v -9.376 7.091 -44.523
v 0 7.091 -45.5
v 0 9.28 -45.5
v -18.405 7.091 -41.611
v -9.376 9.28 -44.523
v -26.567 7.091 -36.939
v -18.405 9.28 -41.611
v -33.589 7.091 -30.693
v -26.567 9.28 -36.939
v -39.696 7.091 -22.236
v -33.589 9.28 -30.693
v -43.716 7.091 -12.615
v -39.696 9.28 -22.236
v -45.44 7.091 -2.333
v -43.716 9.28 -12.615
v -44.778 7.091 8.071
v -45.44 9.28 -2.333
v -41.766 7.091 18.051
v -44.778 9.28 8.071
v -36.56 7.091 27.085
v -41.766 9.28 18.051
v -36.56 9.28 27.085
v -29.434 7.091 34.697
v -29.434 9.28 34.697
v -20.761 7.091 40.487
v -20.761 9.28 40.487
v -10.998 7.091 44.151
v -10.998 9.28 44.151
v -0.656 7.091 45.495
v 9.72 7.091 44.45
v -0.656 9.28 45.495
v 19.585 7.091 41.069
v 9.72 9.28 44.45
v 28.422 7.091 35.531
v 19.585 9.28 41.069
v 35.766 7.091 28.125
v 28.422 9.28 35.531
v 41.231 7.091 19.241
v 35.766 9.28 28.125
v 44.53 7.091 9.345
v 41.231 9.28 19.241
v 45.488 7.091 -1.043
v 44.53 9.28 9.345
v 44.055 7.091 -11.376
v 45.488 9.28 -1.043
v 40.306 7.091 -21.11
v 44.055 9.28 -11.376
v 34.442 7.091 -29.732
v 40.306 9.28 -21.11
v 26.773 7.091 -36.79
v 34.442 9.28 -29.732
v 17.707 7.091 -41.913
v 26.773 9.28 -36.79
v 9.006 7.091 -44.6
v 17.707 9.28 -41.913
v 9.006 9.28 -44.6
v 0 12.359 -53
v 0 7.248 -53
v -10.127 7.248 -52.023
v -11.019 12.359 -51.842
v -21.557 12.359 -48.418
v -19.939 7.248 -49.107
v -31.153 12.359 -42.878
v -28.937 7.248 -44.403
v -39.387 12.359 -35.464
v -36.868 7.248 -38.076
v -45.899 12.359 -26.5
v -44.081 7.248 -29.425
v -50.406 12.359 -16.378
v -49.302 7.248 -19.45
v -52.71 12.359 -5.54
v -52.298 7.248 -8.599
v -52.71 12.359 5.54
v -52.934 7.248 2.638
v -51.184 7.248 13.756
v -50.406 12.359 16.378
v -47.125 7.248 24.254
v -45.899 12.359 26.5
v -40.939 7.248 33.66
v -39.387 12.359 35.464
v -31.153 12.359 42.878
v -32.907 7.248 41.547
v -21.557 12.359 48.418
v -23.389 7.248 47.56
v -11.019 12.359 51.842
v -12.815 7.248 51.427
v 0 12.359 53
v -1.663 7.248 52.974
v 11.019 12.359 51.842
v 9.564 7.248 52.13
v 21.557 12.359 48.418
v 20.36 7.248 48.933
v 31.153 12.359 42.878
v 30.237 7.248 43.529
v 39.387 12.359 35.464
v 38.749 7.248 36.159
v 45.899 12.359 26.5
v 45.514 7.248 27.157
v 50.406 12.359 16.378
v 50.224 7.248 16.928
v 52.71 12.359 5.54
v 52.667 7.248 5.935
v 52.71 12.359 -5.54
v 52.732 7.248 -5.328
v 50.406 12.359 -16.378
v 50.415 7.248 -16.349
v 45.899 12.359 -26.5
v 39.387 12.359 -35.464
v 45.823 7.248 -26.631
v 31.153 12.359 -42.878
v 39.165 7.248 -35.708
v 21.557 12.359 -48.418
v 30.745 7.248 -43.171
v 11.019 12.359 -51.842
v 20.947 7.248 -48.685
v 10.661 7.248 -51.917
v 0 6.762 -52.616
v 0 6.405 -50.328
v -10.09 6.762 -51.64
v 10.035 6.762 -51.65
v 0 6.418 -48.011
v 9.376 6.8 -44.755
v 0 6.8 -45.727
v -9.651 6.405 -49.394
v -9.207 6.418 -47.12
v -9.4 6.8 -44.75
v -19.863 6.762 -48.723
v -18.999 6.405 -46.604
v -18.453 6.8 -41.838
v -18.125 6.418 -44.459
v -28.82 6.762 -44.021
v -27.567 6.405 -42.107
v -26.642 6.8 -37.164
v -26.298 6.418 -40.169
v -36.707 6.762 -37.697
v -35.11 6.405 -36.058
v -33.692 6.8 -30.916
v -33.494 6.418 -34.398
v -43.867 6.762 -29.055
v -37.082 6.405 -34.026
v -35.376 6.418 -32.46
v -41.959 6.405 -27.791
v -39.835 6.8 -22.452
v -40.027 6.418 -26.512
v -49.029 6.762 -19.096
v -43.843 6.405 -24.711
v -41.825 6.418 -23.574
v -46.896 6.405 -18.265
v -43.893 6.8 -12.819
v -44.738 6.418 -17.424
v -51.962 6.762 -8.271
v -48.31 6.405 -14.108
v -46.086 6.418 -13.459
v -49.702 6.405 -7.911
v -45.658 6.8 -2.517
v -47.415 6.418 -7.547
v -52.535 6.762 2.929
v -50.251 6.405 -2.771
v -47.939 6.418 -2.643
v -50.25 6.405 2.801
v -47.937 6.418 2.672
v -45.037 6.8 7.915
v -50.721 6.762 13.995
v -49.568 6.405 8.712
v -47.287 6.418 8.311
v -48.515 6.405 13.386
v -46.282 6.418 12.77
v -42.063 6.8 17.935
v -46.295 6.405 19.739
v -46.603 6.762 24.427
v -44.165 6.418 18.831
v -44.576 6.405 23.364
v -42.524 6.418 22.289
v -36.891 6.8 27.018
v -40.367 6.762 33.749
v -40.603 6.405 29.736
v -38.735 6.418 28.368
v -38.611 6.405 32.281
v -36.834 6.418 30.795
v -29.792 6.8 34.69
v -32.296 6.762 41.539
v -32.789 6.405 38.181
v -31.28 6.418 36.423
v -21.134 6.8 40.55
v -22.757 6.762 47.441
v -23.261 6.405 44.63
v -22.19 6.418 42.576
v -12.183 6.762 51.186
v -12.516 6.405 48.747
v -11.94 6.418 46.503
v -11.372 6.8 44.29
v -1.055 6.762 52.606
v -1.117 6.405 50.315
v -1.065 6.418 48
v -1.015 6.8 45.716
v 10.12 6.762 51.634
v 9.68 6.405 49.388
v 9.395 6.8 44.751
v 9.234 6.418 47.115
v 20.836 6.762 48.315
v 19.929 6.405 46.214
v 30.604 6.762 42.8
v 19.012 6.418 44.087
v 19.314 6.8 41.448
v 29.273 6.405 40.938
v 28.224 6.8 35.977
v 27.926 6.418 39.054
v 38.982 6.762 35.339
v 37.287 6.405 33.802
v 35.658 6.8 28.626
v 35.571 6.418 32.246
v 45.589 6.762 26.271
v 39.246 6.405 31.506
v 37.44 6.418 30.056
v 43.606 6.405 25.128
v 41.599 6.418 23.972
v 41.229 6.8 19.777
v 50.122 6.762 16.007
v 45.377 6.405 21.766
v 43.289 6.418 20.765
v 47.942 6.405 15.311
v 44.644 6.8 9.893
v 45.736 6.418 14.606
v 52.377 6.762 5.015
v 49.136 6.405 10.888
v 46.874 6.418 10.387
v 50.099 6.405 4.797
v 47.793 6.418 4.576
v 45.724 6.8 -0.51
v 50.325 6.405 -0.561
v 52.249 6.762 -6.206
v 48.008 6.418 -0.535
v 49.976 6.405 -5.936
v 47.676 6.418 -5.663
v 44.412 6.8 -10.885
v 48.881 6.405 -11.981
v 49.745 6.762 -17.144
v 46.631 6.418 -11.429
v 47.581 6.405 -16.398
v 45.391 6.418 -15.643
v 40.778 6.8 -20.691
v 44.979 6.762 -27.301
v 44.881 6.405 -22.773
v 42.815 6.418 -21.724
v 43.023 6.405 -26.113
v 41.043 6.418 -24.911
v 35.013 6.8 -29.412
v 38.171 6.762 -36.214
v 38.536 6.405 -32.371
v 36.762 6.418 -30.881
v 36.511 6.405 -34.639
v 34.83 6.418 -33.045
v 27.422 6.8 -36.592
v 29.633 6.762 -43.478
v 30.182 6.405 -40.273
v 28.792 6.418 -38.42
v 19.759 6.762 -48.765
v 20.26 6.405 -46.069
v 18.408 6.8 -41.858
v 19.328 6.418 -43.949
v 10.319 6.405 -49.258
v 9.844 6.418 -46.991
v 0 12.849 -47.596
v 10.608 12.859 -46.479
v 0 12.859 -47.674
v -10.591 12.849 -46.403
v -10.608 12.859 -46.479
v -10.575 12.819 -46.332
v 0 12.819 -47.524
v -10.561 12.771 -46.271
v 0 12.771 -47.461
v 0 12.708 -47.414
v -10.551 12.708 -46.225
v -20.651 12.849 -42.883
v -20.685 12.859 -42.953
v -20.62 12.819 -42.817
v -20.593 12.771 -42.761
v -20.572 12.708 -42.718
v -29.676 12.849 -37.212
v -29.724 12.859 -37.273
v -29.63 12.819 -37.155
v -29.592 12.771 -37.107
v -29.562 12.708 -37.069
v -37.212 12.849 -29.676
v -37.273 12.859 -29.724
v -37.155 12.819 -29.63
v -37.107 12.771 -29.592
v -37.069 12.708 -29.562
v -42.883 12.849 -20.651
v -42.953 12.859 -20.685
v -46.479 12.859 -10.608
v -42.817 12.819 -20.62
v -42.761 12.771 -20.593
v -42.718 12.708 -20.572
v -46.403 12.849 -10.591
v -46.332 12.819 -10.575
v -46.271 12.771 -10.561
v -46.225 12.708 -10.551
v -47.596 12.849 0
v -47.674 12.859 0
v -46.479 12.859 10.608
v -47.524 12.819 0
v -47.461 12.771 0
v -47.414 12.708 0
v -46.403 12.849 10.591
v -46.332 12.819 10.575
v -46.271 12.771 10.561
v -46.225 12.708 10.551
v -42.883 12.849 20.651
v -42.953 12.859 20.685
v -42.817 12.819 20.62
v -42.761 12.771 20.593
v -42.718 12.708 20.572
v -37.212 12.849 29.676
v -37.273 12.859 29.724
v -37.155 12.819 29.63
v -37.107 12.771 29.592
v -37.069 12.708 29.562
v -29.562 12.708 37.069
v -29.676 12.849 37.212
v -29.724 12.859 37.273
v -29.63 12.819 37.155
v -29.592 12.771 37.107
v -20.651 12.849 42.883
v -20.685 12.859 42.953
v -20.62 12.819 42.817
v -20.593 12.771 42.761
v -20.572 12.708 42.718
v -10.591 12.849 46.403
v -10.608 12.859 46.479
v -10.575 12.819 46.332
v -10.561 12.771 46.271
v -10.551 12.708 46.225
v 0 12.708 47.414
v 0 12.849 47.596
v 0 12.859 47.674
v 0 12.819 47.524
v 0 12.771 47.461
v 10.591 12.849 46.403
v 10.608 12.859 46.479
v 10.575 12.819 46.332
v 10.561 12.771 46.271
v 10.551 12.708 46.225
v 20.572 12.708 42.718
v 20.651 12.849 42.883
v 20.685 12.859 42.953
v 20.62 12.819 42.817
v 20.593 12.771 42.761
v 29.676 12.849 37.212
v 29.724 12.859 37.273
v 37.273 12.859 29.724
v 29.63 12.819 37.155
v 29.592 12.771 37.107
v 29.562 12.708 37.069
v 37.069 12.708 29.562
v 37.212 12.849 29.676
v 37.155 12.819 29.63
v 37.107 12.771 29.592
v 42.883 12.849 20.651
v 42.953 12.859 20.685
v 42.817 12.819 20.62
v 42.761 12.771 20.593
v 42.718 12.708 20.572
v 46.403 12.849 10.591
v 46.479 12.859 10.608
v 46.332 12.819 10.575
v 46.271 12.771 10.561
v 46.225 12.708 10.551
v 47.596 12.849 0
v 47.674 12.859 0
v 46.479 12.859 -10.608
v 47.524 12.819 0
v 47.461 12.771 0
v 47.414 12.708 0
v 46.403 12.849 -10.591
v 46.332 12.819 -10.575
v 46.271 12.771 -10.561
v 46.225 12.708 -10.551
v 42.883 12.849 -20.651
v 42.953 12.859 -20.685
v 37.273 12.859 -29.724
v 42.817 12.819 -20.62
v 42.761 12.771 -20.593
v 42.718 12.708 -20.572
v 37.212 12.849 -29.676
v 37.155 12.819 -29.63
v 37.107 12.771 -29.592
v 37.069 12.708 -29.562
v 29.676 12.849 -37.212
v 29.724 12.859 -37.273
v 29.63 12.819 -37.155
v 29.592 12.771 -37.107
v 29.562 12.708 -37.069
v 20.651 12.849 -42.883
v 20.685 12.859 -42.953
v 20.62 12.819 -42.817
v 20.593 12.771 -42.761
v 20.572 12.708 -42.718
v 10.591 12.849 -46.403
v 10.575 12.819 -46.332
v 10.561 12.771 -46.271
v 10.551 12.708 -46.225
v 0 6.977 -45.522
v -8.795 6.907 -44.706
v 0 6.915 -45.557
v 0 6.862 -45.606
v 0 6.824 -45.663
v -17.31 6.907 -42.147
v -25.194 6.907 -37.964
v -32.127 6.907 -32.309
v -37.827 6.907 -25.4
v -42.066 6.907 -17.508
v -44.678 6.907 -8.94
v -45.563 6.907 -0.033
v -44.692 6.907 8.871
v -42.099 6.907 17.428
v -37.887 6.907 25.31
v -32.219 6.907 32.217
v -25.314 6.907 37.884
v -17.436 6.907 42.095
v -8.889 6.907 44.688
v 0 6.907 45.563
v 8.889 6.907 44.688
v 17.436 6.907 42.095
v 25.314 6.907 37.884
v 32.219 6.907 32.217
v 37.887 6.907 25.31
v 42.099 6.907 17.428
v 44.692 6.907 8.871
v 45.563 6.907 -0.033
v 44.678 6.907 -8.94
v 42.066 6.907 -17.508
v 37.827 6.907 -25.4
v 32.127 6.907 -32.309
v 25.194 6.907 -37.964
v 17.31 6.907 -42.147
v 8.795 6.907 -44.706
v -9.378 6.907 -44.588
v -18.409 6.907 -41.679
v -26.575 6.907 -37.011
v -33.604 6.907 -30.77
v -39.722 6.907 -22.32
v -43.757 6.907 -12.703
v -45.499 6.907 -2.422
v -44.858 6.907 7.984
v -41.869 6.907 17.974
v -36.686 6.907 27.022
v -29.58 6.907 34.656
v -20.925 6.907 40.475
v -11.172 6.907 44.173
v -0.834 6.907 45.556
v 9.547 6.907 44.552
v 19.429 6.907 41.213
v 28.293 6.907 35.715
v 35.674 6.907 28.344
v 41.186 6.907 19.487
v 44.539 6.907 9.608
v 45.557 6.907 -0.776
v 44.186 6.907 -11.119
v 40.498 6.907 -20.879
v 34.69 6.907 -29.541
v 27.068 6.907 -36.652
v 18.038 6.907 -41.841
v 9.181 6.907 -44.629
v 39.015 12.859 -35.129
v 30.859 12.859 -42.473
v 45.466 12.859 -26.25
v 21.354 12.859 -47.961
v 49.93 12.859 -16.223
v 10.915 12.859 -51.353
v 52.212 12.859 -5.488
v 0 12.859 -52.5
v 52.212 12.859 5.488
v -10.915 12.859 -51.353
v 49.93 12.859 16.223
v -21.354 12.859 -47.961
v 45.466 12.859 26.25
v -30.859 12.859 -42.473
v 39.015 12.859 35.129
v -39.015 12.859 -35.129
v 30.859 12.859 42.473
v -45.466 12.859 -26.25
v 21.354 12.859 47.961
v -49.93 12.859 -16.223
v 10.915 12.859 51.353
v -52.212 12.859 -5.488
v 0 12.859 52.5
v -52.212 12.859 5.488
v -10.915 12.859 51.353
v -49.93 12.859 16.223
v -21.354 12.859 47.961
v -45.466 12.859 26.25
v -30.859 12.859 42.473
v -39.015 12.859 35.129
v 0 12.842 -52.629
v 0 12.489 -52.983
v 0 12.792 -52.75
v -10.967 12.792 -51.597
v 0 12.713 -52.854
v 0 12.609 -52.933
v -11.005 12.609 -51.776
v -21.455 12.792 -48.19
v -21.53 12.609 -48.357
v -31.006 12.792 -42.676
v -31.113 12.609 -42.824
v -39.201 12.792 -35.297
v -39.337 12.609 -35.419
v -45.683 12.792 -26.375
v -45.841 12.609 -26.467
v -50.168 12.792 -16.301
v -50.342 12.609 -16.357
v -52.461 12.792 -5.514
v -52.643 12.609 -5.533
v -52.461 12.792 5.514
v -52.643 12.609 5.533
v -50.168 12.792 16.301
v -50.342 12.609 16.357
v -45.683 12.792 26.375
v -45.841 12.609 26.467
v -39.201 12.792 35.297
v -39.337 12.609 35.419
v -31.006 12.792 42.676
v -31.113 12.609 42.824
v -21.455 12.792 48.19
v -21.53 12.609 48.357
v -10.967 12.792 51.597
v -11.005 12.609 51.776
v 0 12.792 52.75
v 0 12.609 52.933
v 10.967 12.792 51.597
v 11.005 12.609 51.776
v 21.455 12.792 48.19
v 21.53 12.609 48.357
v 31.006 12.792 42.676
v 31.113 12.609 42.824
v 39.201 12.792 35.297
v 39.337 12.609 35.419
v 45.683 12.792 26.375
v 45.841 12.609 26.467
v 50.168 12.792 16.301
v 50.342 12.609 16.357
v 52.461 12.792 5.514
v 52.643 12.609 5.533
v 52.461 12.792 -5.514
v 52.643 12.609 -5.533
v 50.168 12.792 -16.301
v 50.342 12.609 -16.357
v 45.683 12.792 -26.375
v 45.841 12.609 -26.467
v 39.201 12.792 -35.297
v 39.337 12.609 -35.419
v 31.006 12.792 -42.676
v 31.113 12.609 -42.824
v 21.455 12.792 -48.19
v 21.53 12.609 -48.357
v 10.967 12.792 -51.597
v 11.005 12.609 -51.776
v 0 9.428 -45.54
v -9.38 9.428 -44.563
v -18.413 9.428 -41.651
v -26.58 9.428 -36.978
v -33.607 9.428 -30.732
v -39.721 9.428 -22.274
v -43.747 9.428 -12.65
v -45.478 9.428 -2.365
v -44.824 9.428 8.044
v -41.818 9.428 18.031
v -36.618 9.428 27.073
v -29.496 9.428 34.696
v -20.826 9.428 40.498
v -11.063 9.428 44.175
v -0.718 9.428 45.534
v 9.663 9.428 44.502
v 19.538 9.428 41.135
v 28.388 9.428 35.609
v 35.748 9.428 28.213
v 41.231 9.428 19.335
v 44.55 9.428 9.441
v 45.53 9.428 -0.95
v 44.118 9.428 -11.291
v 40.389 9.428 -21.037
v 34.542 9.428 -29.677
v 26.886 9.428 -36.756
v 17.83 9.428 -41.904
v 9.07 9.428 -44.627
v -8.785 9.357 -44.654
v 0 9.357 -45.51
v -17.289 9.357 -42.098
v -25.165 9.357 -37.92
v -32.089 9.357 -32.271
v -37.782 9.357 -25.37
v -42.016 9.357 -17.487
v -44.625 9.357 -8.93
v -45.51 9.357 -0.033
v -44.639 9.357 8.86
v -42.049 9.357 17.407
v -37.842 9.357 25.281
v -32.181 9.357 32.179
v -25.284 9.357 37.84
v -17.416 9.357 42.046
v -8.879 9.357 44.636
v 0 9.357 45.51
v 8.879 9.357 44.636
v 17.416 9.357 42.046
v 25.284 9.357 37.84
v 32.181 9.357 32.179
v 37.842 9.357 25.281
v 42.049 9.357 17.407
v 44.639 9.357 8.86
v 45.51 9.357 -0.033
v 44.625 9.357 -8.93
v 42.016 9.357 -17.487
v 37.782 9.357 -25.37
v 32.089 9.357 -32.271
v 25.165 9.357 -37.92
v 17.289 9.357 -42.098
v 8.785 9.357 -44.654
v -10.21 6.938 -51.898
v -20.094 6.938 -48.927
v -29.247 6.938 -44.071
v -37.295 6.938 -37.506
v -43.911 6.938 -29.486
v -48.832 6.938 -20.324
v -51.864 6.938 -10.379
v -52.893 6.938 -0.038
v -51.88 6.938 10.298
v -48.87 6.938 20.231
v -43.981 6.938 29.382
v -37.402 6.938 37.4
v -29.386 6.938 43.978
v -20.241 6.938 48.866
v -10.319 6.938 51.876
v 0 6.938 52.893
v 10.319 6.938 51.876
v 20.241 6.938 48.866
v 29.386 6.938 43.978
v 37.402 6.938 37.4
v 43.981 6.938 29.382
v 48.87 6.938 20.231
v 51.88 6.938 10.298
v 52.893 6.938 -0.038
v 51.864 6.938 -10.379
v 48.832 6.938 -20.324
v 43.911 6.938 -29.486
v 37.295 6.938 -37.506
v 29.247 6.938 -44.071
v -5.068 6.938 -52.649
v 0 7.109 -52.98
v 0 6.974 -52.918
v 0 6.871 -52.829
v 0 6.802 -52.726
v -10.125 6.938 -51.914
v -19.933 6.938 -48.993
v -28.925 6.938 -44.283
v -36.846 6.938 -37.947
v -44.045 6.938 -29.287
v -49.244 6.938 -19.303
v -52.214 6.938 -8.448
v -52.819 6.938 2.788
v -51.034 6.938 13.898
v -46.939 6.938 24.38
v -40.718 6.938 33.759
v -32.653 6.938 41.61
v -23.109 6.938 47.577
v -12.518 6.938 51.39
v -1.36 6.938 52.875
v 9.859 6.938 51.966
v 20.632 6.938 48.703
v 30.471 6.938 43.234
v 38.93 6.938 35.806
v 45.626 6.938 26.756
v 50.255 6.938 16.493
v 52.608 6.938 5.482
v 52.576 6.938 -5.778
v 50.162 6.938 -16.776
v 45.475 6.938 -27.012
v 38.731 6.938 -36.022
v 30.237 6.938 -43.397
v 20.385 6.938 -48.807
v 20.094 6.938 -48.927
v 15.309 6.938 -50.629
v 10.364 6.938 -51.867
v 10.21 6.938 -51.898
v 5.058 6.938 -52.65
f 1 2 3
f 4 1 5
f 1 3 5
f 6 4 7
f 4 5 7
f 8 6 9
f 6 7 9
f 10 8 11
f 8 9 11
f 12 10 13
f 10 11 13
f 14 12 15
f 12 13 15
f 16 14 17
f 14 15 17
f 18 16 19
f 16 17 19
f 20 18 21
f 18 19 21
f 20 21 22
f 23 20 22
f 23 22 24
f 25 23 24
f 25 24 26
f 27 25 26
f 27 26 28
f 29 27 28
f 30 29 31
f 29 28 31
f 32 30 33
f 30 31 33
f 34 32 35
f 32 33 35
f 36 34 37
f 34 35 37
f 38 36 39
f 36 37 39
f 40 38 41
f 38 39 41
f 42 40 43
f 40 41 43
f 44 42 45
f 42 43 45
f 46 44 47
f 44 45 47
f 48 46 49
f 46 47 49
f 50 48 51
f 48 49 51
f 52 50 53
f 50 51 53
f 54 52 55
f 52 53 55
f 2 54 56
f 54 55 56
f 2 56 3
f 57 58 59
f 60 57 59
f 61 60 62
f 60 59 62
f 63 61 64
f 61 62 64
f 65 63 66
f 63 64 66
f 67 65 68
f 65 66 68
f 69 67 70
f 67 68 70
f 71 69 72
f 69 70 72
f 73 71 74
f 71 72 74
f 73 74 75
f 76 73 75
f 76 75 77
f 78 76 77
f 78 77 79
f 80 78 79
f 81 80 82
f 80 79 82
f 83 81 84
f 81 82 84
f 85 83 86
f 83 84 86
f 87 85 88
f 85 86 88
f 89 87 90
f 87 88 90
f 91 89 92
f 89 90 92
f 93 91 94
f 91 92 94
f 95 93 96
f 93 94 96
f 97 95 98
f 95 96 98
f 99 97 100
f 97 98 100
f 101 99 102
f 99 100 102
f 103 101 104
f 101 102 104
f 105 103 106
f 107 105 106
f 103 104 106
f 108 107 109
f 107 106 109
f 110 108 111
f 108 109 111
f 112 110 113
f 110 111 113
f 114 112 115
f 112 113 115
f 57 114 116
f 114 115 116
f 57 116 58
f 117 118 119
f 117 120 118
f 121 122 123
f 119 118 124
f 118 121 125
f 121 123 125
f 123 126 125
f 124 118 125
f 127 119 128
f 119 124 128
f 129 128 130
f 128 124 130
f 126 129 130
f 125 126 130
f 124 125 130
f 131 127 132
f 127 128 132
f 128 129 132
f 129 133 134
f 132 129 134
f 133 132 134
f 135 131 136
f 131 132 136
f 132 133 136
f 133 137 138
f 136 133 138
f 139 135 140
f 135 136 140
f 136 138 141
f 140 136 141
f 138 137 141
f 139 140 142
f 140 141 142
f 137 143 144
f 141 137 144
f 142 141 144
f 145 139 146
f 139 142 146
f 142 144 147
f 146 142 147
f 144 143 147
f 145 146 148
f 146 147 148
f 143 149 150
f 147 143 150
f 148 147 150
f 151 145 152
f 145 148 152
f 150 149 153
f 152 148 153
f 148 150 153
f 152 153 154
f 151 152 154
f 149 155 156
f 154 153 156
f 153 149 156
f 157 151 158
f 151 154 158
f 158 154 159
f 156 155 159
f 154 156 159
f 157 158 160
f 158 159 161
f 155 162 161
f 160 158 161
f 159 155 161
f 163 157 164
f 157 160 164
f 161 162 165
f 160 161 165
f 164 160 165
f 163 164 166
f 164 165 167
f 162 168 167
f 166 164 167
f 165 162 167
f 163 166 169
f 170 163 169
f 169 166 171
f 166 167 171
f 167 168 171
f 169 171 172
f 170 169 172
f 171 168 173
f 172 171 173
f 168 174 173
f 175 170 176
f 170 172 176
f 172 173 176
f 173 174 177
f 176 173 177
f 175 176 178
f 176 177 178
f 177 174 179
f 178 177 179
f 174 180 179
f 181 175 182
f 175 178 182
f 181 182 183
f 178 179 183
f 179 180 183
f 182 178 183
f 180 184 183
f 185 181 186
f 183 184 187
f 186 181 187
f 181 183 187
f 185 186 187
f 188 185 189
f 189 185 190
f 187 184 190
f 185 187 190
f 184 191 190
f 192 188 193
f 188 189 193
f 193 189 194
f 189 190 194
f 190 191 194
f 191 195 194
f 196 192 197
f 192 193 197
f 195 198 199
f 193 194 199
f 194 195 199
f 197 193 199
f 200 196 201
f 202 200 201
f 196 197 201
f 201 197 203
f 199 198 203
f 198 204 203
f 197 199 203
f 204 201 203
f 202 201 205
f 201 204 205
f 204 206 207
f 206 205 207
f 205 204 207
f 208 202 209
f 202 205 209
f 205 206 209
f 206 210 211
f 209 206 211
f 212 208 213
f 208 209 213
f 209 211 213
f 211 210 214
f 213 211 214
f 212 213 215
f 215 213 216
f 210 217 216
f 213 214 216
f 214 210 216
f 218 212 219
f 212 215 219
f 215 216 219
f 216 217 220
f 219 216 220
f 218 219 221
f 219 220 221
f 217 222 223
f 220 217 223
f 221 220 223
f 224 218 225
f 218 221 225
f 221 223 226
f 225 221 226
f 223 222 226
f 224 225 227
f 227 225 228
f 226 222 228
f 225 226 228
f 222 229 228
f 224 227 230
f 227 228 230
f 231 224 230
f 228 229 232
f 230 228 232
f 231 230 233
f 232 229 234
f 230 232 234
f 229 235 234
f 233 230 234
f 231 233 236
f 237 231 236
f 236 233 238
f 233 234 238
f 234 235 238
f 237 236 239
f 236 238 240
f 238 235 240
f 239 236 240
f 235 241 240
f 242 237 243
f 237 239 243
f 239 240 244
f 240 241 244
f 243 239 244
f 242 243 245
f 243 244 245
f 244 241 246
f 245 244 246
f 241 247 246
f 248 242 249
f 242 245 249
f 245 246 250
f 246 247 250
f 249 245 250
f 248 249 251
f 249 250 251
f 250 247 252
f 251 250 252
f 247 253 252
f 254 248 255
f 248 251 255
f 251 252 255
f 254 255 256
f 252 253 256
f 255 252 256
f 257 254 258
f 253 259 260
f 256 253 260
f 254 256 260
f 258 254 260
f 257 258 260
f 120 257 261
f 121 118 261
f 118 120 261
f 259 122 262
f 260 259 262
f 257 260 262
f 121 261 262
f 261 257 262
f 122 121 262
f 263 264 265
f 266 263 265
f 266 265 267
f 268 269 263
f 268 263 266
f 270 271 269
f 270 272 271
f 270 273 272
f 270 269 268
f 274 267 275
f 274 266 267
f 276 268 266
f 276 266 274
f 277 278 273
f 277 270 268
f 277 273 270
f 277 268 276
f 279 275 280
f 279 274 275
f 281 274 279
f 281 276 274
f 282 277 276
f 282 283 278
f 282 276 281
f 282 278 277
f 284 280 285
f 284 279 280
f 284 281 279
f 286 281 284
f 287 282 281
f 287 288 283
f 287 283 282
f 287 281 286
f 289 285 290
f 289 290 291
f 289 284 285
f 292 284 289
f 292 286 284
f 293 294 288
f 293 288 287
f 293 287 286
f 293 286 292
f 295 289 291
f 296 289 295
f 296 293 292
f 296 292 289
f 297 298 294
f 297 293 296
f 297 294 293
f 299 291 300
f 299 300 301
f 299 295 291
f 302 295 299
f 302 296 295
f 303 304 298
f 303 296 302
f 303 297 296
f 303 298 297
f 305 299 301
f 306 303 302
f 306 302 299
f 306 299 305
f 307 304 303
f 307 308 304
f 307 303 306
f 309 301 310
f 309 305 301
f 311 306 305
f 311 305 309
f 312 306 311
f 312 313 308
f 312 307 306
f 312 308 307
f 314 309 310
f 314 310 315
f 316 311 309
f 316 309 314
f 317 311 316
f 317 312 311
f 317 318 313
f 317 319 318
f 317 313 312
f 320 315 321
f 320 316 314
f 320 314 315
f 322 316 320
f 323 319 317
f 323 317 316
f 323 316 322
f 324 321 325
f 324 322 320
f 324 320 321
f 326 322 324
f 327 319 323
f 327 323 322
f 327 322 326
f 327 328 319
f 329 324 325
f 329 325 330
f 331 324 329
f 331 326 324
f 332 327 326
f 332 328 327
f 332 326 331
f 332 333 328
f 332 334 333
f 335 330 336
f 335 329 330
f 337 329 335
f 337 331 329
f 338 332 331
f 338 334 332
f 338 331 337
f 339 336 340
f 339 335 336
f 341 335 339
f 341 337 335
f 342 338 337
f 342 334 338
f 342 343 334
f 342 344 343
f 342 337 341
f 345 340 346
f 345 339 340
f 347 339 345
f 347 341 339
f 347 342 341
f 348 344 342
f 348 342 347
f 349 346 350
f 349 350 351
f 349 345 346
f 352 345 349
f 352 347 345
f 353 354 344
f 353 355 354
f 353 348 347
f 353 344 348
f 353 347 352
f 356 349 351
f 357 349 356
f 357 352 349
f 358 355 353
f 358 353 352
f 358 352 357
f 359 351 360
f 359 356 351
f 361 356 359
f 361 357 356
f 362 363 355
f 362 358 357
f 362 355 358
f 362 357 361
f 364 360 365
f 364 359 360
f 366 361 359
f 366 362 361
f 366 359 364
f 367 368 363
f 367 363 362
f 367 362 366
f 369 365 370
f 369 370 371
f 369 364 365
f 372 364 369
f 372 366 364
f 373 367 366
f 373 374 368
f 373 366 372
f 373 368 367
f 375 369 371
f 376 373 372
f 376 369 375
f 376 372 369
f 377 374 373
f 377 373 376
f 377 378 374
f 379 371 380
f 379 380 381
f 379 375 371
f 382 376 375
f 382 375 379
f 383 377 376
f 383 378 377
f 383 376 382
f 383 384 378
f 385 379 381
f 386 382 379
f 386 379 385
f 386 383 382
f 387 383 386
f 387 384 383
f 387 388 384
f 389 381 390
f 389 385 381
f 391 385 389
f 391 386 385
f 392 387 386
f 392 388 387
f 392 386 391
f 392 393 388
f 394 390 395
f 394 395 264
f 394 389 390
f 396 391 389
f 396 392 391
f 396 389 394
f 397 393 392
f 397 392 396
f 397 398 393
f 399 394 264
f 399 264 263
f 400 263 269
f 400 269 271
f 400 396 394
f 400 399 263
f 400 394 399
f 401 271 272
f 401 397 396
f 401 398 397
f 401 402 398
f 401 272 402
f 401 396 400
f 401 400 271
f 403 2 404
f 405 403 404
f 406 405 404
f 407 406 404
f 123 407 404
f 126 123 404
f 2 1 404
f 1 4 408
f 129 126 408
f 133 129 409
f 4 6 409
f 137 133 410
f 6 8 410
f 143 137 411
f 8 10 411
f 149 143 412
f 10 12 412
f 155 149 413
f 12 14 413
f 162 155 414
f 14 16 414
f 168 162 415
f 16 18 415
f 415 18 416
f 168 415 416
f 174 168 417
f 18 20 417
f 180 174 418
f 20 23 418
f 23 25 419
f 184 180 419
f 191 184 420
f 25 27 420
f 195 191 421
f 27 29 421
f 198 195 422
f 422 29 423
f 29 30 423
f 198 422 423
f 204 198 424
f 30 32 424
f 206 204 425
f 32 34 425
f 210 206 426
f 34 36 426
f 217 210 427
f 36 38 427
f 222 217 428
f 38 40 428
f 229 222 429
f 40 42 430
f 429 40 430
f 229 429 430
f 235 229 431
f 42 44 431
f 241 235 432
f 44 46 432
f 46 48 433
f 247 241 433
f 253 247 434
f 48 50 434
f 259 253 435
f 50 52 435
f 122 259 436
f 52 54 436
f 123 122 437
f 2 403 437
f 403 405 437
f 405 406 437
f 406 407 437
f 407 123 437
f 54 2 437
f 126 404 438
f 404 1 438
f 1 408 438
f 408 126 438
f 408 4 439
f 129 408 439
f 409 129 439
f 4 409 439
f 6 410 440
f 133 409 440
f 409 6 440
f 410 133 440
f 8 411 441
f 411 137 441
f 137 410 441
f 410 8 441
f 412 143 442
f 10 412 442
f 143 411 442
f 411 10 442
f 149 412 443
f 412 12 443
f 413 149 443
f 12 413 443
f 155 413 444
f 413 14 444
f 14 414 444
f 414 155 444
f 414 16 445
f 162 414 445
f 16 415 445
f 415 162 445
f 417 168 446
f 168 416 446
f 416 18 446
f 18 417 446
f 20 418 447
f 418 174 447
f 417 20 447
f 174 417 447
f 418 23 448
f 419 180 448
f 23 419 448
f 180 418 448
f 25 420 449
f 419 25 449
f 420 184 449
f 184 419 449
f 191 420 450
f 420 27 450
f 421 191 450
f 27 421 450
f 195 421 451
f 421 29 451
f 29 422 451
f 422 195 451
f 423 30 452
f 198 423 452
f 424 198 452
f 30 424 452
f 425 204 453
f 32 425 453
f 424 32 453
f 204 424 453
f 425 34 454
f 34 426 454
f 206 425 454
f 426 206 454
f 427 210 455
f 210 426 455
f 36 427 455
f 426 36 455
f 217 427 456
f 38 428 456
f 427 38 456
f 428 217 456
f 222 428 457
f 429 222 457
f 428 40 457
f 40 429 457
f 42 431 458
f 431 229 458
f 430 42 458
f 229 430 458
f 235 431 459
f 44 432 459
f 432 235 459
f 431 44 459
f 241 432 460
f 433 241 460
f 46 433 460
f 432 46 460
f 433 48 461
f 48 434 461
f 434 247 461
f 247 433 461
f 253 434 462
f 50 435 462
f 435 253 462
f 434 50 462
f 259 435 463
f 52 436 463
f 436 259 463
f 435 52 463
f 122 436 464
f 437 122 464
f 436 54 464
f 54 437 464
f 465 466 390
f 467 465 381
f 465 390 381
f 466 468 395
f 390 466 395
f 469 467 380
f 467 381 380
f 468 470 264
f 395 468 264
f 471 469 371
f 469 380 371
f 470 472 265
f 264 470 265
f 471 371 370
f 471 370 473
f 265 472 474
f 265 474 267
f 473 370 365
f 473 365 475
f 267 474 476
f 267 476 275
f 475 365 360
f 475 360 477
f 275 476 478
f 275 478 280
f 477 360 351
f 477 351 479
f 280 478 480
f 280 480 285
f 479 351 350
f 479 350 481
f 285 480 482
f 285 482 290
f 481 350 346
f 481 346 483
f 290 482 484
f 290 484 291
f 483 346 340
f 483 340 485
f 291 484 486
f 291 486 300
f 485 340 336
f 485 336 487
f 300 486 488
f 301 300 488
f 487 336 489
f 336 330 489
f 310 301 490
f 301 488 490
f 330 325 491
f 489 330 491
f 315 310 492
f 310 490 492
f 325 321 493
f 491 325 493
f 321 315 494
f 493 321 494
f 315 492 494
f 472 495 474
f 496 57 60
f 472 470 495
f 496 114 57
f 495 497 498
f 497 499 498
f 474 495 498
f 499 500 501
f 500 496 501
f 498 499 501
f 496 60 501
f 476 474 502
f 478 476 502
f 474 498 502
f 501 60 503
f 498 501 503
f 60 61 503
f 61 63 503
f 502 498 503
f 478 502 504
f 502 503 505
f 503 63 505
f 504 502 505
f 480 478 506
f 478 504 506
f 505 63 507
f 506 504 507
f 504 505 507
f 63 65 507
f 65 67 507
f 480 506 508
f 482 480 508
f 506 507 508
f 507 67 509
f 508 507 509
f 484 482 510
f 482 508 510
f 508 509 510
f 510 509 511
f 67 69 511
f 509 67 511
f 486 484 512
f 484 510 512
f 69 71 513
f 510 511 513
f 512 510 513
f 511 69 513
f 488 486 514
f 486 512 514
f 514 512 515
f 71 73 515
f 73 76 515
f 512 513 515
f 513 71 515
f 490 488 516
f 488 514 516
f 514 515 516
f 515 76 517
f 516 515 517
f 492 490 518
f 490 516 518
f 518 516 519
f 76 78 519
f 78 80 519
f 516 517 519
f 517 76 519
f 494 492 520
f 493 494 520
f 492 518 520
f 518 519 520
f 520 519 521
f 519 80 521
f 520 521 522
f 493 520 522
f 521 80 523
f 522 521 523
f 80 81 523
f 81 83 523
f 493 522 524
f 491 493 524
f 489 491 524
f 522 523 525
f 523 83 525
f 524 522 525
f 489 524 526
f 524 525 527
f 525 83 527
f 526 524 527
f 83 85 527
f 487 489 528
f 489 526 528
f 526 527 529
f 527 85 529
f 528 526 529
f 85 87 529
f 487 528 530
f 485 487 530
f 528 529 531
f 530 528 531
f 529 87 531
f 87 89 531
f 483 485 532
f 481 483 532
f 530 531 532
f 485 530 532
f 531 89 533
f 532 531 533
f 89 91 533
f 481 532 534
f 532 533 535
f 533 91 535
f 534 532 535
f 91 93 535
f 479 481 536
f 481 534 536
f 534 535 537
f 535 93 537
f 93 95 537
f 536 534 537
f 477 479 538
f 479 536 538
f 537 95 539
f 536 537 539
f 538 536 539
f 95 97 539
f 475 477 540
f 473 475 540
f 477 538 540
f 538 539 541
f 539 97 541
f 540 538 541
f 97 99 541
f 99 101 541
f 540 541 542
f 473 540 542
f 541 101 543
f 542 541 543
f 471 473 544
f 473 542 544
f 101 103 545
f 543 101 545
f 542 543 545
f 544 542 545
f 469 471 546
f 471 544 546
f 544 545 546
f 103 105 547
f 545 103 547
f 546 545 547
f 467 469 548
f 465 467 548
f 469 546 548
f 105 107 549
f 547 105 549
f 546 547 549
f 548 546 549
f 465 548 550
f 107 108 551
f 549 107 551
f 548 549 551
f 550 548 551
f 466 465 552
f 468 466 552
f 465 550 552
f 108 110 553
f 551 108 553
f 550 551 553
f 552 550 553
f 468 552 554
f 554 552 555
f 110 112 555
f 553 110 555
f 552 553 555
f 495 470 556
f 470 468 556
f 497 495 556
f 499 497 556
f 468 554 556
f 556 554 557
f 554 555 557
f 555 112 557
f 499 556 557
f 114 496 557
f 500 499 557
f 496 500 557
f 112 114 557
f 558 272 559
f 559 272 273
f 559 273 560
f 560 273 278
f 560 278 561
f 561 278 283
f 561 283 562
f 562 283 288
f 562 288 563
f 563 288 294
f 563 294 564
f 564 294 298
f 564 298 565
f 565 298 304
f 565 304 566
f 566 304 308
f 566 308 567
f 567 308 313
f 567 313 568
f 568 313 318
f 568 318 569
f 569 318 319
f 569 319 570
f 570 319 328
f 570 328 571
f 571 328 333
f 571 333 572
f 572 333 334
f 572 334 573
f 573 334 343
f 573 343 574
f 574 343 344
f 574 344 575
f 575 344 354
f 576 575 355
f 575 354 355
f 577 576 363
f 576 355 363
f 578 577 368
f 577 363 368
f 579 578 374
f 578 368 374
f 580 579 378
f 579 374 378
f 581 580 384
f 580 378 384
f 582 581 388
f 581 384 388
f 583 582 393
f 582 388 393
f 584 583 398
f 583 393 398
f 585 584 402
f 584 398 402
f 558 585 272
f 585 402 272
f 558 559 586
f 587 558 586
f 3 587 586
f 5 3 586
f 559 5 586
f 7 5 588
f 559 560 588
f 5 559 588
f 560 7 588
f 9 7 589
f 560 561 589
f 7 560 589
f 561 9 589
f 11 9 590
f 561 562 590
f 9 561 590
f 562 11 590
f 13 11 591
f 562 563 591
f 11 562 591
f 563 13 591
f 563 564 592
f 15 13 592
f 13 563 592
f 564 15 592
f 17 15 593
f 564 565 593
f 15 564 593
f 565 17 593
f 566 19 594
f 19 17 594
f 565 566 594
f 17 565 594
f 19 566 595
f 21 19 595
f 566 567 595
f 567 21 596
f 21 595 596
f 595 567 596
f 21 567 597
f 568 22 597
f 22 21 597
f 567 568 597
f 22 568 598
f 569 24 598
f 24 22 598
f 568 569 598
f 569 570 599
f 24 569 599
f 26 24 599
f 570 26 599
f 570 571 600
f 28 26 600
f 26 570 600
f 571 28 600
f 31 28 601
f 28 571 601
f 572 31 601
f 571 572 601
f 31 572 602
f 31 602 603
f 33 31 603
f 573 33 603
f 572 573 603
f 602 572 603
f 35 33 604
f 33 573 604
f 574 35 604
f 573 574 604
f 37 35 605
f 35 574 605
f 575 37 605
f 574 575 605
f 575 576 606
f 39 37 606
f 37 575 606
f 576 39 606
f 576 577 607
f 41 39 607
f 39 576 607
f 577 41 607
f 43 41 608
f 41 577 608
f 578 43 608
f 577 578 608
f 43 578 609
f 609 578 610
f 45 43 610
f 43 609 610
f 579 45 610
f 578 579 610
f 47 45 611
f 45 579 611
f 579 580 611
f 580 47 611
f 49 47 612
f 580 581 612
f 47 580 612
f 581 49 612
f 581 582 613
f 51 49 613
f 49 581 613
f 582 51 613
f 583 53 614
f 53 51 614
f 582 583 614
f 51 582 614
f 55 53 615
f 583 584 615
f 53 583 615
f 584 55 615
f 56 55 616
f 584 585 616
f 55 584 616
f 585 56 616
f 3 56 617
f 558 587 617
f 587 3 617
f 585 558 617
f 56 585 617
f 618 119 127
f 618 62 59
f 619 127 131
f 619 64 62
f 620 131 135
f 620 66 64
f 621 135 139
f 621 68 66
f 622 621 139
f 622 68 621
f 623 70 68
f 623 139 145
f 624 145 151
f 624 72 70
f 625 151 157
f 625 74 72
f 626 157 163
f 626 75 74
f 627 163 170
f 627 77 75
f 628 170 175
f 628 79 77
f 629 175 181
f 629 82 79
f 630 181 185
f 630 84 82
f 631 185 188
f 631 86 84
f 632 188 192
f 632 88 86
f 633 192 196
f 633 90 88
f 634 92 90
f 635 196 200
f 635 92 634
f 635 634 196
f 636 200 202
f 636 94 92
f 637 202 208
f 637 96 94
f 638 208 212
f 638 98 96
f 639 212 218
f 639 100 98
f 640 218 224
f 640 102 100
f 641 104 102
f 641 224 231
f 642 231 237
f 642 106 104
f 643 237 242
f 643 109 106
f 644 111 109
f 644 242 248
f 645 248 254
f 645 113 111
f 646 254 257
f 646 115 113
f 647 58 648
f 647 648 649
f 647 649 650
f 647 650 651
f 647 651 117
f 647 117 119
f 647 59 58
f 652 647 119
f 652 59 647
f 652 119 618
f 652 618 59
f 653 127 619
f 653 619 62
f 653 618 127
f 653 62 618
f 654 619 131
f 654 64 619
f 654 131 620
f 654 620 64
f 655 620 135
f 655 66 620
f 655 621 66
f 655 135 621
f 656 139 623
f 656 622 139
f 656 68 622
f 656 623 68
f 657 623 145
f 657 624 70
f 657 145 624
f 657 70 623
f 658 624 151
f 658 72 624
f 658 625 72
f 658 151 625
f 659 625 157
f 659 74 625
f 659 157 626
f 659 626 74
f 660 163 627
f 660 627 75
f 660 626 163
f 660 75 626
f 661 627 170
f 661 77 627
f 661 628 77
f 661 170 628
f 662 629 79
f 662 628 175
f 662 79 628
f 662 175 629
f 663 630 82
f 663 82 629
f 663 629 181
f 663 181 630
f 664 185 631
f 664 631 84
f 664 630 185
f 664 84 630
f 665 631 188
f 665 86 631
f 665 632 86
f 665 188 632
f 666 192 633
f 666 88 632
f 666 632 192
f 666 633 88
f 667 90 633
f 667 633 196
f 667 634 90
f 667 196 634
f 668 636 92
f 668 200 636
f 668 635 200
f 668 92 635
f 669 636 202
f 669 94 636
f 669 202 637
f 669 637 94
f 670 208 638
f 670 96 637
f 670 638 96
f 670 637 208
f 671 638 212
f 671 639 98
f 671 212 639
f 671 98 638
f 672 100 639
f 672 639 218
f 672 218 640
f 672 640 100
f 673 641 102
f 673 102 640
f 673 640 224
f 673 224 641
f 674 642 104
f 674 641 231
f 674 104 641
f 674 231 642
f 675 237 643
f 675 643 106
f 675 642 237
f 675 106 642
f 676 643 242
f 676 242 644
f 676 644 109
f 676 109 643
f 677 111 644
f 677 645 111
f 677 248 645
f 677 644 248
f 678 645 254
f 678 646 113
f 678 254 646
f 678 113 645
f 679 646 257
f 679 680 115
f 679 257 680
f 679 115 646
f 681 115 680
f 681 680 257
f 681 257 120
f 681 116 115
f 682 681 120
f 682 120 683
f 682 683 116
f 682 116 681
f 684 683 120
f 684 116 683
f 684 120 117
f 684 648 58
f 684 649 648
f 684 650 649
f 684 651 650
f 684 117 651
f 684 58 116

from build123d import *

# Parameters (mm, degrees)
FILETE1_R = 0.5
FILETE2_R = 0.3


with BuildPart() as part:
    # Esboço1 → Revolução1 (revolve)
    with BuildSketch(Plane.XY, mode=Mode.PRIVATE) as revolu_o1_sk:
        with BuildLine():
            Line((45.5, 6.859262227), (45.5, 9.359262227))
            Line((45.5, 9.359262227), (47.5, 12.859262227))
            Line((47.5, 12.859262227), (53, 12.859262227))
            Line((53, 12.859262227), (53, 6.859262227))
            ThreePointArc((53, 6.859262227), (49.25, 6.364636944), (45.5, 6.859262227))
        make_face()
    revolve(revolu_o1_sk.sketch.rotate(Axis((0, -41.541988481, 0), (0, 1, 0)), 90), axis=Axis((0, -41.541988481, 0), (0, 1, 0)))

    # Filete1
    filete1_edges = [part.edges().sort_by_distance(p)[0] for p in [
        (0, 12.859262227, 53),
        (0, 6.859262227, 53),
    ]]
    fillet(filete1_edges, radius=FILETE1_R)

    # Filete2
    filete2_edges = [part.edges().sort_by_distance(p)[0] for p in [
        (0, 6.859262227, 45.5),
        (0, 9.359262227, 45.5),
        (0, 12.859262227, 47.5),
    ]]
    fillet(filete2_edges, radius=FILETE2_R)


solid = part.part
